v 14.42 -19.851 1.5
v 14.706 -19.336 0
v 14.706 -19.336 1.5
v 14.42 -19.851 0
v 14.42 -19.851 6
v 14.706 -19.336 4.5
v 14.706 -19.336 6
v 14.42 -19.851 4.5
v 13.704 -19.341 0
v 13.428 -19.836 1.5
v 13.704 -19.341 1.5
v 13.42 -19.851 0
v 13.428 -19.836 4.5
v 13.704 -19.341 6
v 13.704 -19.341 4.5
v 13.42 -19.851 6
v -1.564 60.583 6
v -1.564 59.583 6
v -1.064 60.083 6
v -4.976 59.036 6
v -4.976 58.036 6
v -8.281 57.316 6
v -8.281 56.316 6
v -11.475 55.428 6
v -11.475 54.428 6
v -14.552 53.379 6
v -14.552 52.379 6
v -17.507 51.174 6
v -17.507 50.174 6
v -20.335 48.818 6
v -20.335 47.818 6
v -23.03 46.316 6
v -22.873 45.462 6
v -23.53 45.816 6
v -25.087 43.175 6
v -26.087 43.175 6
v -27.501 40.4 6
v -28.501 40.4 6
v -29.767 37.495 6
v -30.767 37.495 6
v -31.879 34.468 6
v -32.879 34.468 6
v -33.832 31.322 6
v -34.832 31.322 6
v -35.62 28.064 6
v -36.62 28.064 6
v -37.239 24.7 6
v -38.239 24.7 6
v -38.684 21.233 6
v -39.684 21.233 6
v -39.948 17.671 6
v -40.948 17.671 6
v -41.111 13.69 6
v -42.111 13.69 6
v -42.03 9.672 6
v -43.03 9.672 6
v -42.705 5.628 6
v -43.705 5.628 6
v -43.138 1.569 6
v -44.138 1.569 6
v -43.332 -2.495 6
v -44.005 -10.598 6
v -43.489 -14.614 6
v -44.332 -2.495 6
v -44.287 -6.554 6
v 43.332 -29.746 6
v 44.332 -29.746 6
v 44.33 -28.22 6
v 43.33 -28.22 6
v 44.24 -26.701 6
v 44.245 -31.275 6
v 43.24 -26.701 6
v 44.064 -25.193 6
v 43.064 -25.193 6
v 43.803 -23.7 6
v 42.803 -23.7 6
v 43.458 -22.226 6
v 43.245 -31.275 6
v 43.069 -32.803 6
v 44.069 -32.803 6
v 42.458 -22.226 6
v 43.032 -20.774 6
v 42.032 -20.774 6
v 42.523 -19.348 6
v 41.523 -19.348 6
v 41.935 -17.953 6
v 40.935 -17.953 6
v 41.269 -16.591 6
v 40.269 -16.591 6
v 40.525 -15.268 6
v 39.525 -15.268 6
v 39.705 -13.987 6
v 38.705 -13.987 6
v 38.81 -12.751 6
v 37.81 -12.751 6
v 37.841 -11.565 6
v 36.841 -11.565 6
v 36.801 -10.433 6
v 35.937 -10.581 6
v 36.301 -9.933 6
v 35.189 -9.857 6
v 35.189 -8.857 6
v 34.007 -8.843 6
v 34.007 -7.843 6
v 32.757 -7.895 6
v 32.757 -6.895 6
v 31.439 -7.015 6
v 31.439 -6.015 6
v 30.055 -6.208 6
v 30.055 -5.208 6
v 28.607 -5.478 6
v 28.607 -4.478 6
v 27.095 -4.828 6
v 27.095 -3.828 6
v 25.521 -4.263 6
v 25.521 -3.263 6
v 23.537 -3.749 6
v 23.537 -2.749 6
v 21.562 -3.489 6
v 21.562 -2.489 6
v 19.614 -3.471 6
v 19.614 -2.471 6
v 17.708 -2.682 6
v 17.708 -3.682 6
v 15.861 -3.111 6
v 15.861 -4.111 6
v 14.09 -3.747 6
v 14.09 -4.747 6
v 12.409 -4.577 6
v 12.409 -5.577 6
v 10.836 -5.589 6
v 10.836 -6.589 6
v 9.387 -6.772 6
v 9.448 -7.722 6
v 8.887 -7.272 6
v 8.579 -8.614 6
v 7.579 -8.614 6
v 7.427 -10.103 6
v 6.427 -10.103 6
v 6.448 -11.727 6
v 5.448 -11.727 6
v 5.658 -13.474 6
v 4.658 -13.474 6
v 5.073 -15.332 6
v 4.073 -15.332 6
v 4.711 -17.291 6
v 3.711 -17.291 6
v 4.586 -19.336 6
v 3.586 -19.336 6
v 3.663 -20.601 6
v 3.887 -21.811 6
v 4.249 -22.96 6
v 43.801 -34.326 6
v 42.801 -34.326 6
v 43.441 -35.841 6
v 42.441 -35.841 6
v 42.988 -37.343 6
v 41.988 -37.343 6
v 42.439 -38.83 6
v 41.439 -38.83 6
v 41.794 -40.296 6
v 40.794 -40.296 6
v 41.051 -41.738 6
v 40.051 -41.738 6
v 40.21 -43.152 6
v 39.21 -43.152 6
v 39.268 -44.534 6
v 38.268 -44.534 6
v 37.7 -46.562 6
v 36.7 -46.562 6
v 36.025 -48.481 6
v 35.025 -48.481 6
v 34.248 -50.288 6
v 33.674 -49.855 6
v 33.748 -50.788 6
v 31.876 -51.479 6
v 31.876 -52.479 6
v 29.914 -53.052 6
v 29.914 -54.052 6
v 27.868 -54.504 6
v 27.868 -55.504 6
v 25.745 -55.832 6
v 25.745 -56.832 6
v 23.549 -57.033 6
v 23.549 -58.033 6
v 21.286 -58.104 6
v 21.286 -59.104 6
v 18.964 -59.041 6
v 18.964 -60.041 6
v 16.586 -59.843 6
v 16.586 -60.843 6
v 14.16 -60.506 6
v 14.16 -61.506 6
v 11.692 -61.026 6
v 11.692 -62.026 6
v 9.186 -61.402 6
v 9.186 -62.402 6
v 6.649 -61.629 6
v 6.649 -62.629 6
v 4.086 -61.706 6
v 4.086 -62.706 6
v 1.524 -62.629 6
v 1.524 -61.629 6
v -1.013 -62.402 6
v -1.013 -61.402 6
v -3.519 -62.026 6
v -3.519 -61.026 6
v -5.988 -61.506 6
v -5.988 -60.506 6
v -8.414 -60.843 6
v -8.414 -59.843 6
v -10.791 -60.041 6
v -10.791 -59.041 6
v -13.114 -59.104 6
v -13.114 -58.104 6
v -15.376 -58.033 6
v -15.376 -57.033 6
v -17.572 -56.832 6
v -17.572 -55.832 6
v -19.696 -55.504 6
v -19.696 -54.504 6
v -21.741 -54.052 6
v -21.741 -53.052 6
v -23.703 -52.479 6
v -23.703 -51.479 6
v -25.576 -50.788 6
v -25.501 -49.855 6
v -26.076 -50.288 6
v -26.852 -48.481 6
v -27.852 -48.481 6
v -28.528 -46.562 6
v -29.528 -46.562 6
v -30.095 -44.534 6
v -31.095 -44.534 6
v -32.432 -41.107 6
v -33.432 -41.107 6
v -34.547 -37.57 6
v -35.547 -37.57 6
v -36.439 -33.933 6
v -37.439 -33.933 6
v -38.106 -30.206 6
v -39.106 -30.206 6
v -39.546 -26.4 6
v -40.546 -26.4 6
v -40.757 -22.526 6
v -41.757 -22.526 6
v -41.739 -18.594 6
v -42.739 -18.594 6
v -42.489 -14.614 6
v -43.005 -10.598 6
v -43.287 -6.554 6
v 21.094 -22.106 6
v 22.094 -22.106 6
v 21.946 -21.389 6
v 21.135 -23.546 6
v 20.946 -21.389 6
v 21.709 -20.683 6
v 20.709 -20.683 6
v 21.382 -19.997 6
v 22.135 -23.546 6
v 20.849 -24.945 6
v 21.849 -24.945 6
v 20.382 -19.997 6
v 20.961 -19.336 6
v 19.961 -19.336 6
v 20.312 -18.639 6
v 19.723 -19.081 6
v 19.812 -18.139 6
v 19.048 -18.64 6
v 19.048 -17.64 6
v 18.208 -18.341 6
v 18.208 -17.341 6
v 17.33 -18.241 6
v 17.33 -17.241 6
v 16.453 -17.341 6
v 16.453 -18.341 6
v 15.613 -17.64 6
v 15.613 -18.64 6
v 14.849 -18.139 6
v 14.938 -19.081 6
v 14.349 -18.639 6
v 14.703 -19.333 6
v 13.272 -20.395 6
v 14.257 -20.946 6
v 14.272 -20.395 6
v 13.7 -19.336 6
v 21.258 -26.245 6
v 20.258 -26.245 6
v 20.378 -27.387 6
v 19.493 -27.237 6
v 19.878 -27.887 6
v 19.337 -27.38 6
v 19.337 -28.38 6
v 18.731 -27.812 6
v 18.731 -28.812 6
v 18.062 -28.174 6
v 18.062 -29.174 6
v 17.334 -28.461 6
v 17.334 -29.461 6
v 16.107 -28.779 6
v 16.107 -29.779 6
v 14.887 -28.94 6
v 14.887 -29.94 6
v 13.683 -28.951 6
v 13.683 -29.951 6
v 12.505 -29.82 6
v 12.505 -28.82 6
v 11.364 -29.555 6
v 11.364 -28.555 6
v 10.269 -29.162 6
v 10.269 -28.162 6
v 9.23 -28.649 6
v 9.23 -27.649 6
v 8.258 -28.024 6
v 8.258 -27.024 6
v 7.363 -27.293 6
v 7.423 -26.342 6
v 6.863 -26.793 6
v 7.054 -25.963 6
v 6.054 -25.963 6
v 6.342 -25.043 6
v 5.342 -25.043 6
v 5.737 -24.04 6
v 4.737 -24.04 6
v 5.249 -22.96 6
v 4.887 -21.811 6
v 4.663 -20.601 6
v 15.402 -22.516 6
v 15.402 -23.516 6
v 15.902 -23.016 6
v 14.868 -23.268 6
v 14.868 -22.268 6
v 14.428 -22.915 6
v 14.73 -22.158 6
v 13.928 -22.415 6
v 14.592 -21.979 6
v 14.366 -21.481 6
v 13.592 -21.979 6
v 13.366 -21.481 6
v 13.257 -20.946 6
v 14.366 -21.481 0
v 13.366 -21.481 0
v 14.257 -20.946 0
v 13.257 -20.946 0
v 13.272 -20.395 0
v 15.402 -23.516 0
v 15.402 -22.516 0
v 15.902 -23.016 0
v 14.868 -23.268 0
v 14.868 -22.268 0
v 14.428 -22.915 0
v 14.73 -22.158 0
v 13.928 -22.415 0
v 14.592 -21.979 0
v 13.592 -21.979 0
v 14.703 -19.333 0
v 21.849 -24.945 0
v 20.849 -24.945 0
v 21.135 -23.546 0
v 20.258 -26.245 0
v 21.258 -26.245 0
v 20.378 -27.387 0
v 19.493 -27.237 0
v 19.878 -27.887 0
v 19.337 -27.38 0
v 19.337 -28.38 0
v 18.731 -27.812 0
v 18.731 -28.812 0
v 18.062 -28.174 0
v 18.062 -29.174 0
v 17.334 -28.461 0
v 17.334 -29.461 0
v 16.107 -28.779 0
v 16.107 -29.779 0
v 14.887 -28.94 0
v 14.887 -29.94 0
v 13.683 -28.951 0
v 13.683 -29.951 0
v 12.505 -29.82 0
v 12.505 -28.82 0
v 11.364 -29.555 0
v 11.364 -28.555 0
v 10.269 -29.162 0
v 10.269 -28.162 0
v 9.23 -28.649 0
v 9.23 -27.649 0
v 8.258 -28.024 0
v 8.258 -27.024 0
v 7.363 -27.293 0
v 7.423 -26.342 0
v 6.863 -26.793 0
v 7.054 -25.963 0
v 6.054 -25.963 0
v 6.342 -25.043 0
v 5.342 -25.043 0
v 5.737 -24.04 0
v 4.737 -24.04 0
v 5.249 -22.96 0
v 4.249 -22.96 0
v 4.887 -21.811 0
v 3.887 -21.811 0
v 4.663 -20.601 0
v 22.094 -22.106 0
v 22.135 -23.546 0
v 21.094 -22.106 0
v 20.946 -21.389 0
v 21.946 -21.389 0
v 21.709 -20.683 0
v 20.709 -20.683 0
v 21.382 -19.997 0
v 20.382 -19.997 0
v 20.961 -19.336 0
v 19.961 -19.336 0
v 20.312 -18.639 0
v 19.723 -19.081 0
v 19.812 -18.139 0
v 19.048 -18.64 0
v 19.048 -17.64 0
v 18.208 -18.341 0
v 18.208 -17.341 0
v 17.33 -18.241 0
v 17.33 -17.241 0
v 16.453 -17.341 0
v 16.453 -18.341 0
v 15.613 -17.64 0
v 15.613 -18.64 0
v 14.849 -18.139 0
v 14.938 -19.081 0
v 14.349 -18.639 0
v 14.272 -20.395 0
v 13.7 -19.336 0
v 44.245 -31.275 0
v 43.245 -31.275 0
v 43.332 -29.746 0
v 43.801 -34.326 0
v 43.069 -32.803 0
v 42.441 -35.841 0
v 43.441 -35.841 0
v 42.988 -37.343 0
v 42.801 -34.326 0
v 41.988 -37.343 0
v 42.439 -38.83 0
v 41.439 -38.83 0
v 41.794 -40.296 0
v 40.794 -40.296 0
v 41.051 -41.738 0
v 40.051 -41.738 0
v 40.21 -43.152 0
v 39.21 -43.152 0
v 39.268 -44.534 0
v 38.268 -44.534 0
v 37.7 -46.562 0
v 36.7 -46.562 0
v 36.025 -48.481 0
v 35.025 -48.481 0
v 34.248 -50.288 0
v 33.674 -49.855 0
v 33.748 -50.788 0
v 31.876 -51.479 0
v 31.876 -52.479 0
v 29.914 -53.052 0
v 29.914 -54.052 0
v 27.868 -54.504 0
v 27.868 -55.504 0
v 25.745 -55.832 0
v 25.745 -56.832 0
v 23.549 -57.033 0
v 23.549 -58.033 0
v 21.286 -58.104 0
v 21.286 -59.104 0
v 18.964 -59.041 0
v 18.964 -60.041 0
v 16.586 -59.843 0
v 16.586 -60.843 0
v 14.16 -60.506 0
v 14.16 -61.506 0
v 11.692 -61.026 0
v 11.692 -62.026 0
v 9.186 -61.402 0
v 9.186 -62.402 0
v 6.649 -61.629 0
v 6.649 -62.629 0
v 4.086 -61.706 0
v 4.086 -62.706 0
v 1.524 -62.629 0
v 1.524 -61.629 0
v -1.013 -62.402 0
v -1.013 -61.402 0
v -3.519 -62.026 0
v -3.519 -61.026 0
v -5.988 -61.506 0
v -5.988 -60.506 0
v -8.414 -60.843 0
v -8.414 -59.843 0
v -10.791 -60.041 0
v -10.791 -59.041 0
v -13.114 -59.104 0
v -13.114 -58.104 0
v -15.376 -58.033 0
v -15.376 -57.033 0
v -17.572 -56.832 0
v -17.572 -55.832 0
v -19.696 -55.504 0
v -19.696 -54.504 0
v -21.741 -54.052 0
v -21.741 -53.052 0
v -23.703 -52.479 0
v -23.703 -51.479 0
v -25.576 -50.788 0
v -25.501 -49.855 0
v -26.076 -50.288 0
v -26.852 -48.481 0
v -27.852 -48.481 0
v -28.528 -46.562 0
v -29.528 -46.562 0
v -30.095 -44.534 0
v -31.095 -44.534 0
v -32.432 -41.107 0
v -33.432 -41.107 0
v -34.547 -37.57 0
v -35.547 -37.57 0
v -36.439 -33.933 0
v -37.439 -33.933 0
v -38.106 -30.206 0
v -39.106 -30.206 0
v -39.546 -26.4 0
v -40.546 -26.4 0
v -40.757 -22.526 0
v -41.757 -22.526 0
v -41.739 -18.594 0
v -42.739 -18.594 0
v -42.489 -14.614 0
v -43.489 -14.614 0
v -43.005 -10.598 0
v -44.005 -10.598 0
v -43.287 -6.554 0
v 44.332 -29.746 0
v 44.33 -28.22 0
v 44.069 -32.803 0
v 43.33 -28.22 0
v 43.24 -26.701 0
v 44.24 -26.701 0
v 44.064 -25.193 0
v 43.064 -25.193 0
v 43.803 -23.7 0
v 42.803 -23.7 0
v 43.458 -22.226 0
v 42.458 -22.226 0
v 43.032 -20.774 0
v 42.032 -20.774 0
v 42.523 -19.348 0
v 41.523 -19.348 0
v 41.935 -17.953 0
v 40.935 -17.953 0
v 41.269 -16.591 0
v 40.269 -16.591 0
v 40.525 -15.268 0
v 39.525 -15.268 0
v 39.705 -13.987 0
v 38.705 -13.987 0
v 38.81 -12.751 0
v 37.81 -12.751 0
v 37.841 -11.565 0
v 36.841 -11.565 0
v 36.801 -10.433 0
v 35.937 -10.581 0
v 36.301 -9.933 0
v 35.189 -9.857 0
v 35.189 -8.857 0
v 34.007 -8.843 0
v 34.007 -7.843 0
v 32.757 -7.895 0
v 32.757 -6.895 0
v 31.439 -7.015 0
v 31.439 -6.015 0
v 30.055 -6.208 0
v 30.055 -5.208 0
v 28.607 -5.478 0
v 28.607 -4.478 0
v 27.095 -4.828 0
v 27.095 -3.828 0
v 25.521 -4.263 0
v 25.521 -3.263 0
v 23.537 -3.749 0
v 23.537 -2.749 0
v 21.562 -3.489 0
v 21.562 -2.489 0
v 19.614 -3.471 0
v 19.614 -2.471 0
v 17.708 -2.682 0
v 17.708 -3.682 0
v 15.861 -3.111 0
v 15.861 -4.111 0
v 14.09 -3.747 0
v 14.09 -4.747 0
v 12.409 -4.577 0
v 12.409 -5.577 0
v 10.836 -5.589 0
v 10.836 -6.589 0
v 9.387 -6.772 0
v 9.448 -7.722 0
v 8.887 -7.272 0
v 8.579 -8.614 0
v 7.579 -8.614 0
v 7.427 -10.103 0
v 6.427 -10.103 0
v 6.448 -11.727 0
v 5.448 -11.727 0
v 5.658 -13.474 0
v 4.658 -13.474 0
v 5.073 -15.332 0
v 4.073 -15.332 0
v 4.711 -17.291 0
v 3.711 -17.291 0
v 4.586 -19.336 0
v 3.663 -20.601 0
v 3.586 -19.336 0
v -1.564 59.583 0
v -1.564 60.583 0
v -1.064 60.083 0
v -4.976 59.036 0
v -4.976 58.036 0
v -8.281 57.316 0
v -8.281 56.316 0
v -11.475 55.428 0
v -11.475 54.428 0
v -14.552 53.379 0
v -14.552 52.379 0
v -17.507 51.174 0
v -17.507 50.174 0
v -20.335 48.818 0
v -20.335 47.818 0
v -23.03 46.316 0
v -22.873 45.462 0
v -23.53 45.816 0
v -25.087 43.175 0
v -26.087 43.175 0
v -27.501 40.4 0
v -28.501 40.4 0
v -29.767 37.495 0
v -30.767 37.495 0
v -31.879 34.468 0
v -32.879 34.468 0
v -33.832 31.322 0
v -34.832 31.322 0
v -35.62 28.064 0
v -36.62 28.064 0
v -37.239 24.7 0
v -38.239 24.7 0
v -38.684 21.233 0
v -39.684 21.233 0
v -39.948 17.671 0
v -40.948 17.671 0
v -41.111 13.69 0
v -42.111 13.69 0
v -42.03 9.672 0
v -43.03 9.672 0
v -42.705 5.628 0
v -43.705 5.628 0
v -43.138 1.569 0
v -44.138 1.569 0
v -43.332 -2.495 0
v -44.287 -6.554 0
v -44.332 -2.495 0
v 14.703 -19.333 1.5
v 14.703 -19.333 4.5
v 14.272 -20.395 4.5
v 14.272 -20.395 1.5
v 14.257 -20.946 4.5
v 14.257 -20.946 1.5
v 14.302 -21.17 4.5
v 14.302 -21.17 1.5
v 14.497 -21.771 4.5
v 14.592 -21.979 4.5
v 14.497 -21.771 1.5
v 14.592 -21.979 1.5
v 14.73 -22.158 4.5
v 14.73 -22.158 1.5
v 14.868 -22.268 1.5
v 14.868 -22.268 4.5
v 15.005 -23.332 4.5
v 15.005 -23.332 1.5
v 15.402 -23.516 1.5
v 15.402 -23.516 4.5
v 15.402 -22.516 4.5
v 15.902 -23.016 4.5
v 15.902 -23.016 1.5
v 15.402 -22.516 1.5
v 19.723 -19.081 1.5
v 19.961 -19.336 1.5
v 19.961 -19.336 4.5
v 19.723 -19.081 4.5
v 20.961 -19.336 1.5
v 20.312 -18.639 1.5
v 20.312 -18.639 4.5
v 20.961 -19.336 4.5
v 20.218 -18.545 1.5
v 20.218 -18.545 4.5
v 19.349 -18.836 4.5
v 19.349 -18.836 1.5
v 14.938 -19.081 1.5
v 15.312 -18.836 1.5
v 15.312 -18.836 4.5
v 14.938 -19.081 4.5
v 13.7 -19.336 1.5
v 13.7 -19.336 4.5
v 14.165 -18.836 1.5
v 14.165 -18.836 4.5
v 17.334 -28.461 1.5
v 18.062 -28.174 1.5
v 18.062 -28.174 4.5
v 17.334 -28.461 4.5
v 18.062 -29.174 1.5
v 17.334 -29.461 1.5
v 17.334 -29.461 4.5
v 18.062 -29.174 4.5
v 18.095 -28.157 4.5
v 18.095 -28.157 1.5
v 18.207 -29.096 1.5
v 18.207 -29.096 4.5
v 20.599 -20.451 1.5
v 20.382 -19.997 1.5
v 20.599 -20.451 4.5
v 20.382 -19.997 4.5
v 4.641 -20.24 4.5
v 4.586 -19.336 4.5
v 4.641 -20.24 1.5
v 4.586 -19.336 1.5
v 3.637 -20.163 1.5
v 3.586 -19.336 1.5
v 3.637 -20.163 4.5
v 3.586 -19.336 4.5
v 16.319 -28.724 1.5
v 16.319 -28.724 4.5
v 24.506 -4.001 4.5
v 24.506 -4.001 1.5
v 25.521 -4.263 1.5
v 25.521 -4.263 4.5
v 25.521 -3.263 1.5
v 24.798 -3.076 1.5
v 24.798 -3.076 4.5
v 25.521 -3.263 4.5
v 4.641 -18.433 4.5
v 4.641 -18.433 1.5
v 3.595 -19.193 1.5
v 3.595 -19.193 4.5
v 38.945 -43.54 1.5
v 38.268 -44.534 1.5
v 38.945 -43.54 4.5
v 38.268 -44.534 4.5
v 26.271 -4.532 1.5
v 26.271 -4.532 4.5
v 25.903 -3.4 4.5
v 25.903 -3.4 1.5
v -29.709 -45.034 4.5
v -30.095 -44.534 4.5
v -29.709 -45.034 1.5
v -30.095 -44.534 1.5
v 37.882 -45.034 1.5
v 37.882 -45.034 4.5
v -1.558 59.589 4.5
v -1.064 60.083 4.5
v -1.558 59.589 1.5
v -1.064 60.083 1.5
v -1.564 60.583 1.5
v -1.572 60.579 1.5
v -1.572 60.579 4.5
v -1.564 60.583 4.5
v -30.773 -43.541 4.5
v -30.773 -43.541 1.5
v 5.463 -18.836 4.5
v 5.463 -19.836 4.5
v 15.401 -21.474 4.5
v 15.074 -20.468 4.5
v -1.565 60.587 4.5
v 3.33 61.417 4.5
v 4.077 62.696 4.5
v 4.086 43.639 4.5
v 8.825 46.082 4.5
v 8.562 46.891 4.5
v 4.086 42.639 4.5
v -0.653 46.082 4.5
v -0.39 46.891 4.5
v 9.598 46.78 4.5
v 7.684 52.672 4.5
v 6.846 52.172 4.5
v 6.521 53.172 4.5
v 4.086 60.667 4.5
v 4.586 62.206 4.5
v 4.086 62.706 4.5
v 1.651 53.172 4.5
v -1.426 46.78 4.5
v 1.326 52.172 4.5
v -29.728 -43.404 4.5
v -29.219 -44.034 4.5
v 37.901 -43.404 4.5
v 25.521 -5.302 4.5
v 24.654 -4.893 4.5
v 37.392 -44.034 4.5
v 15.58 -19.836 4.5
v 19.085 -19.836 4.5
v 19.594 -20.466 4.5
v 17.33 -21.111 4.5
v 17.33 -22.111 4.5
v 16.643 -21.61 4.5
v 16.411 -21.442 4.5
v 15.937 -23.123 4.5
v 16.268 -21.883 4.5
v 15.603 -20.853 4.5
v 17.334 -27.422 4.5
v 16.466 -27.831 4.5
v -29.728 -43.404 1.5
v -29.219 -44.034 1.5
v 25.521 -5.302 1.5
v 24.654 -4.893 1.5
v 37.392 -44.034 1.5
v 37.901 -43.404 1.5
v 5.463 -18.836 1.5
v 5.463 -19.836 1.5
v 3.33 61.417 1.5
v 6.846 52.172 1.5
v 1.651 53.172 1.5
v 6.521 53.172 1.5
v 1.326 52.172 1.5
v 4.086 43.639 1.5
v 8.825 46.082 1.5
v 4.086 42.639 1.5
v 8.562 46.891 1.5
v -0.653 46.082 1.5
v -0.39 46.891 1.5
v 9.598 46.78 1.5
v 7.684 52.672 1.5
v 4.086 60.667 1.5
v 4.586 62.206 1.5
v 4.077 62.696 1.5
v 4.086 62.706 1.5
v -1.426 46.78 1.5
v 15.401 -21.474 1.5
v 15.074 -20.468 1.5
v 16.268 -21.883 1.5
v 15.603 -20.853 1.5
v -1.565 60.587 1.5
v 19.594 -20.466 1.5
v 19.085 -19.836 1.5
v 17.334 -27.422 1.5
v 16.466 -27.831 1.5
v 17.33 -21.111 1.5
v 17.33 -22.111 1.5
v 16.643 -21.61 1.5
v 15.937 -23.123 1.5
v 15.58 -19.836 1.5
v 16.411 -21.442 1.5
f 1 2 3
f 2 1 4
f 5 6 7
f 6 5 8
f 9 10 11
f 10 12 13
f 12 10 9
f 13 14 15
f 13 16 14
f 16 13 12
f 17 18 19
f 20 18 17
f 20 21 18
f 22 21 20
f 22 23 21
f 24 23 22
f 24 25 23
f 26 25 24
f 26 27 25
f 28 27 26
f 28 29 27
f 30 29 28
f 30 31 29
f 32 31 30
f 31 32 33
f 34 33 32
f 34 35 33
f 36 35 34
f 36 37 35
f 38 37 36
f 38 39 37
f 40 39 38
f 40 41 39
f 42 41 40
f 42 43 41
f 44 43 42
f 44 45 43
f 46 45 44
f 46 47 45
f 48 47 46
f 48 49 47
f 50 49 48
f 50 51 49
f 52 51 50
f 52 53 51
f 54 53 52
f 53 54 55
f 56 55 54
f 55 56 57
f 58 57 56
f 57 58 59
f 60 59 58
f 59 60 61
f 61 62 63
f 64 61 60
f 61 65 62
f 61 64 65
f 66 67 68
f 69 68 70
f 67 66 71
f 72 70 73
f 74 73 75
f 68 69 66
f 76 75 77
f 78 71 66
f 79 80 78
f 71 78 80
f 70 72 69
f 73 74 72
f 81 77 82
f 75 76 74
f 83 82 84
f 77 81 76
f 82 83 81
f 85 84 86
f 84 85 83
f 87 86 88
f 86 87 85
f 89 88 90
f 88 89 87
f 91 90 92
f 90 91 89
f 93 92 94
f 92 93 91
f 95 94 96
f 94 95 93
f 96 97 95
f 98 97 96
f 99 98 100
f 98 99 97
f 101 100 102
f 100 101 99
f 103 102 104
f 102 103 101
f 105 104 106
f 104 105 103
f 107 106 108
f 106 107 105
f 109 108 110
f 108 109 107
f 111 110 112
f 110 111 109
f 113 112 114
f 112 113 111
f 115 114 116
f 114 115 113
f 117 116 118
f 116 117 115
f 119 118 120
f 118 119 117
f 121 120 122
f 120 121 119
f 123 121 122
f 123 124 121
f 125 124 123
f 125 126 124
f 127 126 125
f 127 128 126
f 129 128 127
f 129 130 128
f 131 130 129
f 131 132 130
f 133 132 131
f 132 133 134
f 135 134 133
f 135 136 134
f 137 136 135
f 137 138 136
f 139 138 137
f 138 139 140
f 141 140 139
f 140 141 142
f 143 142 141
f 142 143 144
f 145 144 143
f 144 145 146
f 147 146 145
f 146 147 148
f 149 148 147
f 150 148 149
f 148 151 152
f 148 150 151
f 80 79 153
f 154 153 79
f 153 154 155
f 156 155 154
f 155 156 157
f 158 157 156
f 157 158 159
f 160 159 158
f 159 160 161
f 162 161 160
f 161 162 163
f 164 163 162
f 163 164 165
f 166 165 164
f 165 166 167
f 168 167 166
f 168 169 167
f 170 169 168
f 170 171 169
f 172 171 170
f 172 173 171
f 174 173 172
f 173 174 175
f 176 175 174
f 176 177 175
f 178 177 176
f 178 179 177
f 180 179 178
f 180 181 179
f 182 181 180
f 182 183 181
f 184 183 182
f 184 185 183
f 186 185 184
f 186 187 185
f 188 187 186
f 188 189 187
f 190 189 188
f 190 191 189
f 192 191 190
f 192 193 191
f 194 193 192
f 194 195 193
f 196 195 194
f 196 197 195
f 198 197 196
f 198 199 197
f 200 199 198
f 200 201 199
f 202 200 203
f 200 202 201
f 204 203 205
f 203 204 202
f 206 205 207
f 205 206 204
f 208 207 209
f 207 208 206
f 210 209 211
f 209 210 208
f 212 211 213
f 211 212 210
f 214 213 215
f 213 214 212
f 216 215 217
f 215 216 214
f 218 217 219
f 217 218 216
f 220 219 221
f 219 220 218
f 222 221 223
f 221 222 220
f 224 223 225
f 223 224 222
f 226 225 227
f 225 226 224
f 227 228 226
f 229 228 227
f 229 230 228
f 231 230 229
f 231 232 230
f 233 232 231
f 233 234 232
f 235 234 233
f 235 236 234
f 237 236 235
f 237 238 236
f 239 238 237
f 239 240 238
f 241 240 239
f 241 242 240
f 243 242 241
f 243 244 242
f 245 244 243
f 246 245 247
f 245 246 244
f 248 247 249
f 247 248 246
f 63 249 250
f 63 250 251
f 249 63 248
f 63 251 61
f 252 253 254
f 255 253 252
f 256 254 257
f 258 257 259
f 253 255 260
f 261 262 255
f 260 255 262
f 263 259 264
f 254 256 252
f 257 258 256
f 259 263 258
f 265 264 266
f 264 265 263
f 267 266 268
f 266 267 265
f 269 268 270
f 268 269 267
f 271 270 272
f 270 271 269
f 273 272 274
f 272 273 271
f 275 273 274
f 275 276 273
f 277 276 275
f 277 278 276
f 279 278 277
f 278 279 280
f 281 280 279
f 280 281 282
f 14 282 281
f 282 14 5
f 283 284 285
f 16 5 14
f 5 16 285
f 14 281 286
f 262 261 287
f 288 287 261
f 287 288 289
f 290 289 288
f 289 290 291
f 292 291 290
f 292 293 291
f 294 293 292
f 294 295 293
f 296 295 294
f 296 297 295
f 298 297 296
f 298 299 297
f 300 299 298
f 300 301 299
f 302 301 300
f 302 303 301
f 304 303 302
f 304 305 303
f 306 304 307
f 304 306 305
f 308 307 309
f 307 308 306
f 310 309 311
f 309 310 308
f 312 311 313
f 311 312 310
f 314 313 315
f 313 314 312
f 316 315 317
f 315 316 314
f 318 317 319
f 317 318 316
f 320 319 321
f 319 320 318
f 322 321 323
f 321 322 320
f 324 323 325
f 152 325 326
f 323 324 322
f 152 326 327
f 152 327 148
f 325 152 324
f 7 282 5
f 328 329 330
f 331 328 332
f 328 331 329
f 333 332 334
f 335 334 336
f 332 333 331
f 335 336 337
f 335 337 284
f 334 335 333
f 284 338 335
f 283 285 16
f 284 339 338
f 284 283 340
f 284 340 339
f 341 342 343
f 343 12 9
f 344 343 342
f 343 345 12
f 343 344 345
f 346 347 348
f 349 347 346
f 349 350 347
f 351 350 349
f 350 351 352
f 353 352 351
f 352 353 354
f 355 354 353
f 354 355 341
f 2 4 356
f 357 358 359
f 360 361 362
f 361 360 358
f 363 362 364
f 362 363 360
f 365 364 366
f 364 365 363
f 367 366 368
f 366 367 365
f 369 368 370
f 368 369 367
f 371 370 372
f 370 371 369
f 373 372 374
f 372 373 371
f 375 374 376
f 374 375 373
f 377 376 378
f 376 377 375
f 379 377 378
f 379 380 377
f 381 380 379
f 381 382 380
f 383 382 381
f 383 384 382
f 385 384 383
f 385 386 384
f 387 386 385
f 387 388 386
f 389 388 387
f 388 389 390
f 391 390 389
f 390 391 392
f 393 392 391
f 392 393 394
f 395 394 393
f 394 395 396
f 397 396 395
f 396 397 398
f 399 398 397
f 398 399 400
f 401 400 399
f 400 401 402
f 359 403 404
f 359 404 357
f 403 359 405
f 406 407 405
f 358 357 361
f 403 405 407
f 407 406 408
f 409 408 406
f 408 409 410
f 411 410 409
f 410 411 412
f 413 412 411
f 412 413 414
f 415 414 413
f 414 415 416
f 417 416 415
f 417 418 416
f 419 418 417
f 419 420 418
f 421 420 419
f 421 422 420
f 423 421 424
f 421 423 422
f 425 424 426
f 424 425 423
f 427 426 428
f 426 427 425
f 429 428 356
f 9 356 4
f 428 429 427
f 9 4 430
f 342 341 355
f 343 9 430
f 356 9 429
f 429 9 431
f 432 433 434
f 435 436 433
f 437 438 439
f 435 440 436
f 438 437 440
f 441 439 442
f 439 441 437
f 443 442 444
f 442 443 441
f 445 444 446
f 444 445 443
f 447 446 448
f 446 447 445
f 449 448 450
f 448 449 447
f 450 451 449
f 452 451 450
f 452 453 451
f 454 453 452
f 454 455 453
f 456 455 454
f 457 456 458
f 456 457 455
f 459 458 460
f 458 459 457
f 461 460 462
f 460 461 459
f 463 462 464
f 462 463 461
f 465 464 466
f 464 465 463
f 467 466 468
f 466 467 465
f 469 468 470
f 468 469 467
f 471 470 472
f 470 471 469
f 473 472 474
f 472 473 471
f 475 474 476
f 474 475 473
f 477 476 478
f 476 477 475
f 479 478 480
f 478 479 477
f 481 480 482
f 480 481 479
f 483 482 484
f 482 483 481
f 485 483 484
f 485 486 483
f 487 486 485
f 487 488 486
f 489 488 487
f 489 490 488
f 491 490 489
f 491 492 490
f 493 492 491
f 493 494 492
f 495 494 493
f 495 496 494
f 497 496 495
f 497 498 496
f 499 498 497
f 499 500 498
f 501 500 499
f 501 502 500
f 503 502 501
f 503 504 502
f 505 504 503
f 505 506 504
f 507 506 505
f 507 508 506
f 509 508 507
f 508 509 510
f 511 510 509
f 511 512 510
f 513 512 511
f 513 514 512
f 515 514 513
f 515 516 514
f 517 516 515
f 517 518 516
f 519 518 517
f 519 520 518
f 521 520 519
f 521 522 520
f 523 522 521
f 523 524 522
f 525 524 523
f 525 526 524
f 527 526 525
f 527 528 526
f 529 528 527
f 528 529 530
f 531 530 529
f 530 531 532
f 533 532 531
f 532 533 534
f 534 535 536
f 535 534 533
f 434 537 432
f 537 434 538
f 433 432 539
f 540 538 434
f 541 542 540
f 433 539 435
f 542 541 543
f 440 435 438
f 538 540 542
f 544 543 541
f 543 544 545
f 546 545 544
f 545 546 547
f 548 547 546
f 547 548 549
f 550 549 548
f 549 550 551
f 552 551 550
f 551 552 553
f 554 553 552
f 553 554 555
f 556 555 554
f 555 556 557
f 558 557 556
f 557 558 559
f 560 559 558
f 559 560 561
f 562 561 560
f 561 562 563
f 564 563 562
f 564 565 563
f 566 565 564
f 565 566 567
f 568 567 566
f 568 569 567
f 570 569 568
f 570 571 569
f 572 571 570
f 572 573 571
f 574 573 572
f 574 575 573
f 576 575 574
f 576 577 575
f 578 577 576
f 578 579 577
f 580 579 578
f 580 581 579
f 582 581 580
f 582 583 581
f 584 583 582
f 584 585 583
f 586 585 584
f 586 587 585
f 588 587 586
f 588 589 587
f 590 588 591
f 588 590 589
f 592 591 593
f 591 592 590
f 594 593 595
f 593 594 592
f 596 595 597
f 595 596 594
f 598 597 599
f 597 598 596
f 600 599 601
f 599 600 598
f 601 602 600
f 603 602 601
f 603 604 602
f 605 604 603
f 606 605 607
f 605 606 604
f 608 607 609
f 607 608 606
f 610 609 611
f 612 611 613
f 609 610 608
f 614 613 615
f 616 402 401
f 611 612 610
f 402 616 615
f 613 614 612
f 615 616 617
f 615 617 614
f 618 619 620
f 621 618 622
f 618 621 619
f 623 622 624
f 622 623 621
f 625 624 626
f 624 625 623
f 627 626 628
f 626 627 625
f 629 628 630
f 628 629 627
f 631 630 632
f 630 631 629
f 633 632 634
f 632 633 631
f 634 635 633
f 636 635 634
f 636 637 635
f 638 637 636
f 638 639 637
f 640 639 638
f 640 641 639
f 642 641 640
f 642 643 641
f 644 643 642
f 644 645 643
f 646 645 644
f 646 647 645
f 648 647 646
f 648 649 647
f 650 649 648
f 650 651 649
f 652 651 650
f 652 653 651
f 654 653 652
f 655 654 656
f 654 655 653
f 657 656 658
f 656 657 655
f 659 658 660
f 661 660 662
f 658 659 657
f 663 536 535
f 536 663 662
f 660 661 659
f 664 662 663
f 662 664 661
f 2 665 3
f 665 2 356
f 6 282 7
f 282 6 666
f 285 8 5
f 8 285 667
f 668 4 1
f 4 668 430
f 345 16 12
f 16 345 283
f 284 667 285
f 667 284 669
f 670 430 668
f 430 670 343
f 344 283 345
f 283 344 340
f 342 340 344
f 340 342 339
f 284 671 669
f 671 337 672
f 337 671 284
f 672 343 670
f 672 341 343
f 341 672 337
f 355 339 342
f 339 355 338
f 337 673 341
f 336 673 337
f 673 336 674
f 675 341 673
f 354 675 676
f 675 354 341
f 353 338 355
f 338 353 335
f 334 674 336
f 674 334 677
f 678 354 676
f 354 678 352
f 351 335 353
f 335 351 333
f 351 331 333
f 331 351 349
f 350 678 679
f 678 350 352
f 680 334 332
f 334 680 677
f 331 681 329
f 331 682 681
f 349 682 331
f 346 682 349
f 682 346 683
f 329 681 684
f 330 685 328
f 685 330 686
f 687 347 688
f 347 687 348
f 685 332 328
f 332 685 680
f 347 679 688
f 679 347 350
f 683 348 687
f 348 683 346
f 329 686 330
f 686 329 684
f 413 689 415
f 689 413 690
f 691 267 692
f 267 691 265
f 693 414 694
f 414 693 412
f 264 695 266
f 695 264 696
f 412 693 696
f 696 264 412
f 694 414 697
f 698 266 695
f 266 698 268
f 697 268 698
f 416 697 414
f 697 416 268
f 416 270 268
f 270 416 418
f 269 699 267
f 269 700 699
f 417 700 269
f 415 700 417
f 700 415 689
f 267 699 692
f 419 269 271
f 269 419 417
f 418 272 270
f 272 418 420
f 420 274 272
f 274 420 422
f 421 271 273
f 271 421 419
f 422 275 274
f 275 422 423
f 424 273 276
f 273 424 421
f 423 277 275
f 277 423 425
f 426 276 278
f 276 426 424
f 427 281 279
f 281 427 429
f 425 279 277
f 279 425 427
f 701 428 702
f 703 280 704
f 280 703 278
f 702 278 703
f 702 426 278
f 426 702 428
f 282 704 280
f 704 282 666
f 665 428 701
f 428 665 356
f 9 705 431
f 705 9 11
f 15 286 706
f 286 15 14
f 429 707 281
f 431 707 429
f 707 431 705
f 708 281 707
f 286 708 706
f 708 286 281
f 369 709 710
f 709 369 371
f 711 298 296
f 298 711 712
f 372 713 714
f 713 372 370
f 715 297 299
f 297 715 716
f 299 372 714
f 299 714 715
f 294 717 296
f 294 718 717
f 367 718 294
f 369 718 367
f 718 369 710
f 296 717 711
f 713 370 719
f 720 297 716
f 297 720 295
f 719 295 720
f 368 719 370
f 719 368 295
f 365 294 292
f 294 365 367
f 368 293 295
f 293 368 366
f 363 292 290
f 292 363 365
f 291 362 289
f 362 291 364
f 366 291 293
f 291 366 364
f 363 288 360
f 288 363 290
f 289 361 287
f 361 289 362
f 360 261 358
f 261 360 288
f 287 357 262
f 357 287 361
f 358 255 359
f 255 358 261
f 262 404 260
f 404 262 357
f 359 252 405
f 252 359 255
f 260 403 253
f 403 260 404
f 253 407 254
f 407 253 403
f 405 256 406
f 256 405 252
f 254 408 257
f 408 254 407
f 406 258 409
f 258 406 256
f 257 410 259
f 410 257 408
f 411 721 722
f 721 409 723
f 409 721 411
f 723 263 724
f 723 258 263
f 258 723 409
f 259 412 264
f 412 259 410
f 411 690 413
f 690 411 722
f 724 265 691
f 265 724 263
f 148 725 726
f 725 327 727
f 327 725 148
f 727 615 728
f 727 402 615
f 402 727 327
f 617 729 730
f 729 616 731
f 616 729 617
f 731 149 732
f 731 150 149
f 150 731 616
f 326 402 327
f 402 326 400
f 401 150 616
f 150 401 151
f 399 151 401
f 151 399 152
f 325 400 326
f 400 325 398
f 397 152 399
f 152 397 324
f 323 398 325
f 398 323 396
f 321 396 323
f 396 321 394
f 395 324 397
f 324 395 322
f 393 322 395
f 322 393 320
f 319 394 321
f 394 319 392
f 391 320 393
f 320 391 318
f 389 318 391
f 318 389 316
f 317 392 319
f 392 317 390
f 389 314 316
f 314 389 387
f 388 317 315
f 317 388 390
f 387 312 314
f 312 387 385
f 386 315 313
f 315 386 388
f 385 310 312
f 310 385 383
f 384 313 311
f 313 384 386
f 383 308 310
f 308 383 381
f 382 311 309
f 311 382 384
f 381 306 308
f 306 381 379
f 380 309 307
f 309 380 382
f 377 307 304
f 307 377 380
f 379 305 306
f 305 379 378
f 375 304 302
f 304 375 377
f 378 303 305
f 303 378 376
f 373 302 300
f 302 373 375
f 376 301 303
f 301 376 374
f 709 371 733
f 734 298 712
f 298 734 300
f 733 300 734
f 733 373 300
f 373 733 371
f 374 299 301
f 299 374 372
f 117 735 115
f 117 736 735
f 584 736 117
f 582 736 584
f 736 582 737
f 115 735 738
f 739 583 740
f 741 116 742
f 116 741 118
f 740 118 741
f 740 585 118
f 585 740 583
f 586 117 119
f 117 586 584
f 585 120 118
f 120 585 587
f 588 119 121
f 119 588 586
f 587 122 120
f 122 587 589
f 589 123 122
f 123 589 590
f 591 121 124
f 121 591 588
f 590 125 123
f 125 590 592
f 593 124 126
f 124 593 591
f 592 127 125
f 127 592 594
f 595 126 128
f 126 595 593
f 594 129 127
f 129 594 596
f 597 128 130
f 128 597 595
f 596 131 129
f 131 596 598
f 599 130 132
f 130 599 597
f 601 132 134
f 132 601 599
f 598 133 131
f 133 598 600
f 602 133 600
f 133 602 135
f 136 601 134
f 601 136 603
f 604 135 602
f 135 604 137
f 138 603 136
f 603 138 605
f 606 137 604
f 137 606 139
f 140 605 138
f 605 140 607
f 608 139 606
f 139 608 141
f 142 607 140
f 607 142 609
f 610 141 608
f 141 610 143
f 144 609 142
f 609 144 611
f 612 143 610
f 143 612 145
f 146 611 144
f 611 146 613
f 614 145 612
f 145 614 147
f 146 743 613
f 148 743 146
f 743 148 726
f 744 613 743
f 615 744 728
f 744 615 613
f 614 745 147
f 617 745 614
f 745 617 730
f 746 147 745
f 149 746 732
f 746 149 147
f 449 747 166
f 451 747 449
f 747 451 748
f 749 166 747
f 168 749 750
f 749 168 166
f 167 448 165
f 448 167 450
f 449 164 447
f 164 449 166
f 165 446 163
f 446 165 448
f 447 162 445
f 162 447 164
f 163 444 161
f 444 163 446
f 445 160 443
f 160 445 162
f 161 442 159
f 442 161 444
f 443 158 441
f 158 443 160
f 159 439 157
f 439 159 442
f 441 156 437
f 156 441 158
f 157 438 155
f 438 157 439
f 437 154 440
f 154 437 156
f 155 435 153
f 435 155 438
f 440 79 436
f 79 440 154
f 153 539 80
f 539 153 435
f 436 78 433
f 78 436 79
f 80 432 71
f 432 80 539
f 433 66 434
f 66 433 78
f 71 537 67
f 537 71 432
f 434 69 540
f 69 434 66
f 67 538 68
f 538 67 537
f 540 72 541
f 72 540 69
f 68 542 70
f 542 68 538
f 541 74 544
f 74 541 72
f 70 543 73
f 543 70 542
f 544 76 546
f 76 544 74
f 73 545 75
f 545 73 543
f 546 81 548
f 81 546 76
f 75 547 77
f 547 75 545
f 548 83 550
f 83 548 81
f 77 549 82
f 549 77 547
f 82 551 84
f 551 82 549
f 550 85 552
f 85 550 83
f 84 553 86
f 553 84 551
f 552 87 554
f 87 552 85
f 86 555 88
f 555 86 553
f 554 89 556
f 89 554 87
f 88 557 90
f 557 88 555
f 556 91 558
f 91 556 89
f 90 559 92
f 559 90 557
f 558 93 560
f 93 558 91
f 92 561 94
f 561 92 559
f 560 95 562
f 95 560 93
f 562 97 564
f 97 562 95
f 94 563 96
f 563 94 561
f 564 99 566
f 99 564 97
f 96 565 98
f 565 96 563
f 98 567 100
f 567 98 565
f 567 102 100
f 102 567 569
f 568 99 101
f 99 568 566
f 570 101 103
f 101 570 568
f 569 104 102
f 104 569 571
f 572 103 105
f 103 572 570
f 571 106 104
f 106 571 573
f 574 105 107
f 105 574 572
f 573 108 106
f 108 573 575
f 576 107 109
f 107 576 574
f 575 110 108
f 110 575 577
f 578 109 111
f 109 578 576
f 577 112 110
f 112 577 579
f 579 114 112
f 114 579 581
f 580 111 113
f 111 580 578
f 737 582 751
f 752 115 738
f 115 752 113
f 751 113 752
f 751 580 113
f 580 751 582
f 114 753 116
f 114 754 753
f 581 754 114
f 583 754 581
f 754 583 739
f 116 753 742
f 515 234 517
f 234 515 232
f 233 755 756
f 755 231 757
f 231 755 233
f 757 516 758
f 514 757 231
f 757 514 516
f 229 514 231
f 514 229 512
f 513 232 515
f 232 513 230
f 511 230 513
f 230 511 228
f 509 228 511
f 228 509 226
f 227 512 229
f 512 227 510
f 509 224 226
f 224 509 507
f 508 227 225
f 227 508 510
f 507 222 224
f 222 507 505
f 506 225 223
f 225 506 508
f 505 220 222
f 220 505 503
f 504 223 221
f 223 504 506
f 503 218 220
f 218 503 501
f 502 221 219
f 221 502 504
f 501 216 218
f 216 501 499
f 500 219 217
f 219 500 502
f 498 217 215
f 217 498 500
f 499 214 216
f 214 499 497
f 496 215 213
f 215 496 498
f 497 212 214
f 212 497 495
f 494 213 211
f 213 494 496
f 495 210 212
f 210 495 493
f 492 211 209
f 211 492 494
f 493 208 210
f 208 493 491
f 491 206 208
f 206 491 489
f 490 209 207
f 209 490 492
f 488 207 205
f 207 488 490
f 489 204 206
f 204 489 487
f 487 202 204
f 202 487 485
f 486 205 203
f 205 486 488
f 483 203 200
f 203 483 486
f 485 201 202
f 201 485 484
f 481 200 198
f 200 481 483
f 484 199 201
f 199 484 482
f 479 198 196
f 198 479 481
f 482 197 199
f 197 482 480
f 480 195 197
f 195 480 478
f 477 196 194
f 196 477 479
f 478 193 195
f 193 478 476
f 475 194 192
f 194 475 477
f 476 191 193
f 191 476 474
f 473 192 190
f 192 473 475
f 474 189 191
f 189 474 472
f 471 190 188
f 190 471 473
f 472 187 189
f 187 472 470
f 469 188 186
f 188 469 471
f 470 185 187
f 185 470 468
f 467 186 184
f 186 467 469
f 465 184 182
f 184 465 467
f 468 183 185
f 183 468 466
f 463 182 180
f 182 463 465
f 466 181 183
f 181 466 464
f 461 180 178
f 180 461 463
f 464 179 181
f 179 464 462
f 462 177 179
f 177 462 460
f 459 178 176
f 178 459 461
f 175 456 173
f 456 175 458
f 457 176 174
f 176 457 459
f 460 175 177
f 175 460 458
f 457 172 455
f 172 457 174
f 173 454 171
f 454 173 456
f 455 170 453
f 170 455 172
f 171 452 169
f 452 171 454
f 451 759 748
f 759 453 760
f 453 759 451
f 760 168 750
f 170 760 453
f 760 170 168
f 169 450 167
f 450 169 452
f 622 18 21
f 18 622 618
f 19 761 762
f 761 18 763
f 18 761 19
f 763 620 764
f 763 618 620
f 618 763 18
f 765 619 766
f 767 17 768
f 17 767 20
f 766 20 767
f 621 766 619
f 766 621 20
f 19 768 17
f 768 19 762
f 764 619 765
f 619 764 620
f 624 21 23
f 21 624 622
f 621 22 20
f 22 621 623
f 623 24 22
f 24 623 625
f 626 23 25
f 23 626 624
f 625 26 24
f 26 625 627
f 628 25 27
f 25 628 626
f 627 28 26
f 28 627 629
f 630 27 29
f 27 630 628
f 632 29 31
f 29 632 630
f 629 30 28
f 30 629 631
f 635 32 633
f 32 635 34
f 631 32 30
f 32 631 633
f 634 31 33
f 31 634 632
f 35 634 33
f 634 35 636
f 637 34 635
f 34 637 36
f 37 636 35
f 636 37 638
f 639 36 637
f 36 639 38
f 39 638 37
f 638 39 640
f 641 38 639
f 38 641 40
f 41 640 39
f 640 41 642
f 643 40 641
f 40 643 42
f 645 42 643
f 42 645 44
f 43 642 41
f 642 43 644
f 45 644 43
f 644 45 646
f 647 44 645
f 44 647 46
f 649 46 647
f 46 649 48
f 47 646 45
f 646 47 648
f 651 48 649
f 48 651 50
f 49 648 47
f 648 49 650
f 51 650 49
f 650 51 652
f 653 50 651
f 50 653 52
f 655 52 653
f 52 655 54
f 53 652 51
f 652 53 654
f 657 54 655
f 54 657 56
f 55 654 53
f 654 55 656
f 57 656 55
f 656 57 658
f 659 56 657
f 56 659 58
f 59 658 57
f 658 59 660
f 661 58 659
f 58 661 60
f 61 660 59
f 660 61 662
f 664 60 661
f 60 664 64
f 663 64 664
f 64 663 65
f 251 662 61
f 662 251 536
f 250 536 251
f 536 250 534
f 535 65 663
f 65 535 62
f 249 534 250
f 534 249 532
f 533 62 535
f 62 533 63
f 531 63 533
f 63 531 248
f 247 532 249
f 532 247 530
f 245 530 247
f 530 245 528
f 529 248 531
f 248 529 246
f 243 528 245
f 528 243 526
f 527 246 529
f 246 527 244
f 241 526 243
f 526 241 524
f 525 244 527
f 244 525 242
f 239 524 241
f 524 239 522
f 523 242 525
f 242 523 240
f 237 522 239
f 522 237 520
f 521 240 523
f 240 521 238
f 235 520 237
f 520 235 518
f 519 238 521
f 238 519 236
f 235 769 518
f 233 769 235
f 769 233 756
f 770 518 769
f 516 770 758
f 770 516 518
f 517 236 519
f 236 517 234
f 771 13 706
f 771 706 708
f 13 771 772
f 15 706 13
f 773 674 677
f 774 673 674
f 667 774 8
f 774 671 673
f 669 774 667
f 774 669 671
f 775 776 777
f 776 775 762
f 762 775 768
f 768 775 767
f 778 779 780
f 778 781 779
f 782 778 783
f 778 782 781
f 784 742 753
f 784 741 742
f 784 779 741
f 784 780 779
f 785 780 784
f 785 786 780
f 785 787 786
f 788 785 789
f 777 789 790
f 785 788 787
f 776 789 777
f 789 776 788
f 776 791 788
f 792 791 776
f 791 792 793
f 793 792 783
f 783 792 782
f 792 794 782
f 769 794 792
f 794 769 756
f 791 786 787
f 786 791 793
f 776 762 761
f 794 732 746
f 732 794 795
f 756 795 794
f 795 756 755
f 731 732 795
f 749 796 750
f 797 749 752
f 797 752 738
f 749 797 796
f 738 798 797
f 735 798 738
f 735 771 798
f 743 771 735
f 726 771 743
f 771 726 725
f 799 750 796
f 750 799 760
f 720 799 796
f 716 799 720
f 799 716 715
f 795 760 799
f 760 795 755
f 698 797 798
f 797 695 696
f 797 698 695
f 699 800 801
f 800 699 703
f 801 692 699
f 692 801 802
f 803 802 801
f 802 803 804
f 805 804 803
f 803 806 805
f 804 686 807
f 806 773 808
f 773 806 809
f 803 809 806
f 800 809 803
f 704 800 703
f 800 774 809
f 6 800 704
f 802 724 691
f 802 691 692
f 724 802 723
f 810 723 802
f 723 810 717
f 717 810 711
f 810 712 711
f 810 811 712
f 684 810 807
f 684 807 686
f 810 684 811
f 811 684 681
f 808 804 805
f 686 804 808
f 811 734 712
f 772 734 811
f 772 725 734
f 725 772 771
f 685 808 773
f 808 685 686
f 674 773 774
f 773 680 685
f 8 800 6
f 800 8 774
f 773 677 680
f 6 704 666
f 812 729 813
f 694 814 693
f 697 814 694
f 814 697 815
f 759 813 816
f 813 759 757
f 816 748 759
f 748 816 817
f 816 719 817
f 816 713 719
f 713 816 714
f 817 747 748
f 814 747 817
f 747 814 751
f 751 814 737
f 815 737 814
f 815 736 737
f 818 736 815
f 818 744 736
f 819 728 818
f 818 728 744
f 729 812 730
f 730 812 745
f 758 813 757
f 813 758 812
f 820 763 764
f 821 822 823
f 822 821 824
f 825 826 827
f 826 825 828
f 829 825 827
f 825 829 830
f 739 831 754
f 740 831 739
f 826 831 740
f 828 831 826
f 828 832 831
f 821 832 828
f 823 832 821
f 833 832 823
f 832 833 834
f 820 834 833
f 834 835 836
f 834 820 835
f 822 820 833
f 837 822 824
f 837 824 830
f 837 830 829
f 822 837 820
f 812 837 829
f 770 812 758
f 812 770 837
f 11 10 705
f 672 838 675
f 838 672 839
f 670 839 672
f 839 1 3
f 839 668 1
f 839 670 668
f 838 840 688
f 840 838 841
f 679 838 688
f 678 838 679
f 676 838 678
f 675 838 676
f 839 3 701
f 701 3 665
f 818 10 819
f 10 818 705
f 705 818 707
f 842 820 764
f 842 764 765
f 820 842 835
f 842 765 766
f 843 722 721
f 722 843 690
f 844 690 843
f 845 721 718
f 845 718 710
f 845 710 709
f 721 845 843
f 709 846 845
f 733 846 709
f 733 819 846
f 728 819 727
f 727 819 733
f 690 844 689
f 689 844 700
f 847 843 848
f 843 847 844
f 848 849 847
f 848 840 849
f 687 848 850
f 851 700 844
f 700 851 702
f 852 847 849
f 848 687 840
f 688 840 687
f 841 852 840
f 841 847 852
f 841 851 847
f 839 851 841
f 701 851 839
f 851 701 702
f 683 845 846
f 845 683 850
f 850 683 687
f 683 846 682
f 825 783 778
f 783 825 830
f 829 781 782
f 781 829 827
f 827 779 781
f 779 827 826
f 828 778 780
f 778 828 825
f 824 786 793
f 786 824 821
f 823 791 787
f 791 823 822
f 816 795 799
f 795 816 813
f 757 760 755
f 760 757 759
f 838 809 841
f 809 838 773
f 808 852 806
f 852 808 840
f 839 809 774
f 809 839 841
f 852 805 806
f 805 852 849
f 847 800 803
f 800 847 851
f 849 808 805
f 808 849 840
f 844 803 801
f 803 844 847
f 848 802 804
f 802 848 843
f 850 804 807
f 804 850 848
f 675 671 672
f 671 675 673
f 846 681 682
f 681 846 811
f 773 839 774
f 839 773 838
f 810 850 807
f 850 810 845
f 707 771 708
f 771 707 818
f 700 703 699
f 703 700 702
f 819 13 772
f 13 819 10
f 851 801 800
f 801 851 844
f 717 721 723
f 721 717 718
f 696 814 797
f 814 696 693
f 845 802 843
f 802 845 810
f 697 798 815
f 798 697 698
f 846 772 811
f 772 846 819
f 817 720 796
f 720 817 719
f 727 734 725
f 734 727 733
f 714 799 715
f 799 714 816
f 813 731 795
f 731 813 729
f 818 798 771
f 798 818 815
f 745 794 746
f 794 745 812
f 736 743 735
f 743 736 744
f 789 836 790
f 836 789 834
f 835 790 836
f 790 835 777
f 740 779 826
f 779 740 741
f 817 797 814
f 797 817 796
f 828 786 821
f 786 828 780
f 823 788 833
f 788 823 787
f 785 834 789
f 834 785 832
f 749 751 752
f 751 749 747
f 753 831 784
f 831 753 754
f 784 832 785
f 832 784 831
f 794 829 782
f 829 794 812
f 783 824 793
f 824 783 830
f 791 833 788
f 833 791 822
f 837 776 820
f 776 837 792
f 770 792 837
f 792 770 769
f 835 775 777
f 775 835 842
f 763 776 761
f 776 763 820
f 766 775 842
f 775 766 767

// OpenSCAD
// Module names are of the form poly_<inkscape-path-id>().  As a result,
// you can associate a polygon in this OpenSCAD program with the corresponding
// SVG element in the Inkscape document by looking for the XML element with
// the attribute id="inkscape-path-id".

// fudge value is used to ensure that subtracted solids are a tad taller
// in the z dimension than the polygon being subtracted from.  This helps
// keep the resulting .stl file manifold.
fudge = 0.1;
height = 5;
line_fn = 4;
min_line_width = 1.0;
function min_line_mm(w) = max(min_line_width, w) * 90/25.4;


path4286_0_center = [4.460870,-216.646445];
path4286_0_points = [[-5.545955,-212.905725],[14.467695,-220.387165]];
module poly_path4286(h, w, s, res=line_fn)
{
  scale([25.4/90, -25.4/90, 1]) union()
  {
    for (t = [0: len(path4286_0_points)-2]) {
      hull() {
        translate(path4286_0_points[t]) 
          cylinder(h=h, r=w/2, $fn=res);
        translate(path4286_0_points[t + 1]) 
          cylinder(h=h, r=w/2, $fn=res);
      }
    }
  }
}

path4209_0_center = [51.659111,75.034640];
path4209_0_points = [[50.337655,68.514815],[49.321681,70.339201],[48.798986,72.267105],[48.743727,74.218991],[49.130061,76.115326],[49.932148,77.876575],[51.124144,79.423205],[52.680207,80.675679],[54.574495,81.554465]];
path4209_1_center = [61.407165,65.688942];
path4209_1_points = [[72.499345,68.514815],[70.198753,66.042177],[67.493201,64.276006],[64.517676,63.216304],[61.407165,62.863070],[58.296654,63.216304],[55.321130,64.276006],[52.615578,66.042177],[50.314985,68.514815]];
path4209_2_center = [69.038162,85.566485];
path4209_2_points = [[61.418495,102.618155],[63.999869,101.602263],[66.368730,100.316580],[68.516652,98.787047],[70.435205,97.039601],[73.550496,92.994727],[75.647179,88.389470],[76.657830,83.431340],[76.515024,78.327847],[75.990004,75.786436],[75.151337,73.286502],[73.990593,70.853982],[72.499345,68.514815]];
path4209_3_center = [37.948885,86.434366];
path4209_3_points = [[14.479275,68.514815],[14.751886,72.995087],[15.545917,77.283231],[16.825666,81.353309],[18.555431,85.179382],[20.699512,88.735512],[23.222206,91.995758],[26.087811,94.934184],[29.260626,97.524849],[32.704950,99.741815],[36.385079,101.559144],[40.265314,102.950896],[44.309951,103.891133],[48.483290,104.353917],[52.749628,104.313307],[57.073263,103.743366],[61.418495,102.618155]];
path4209_4_center = [52.453905,39.520367];
path4209_4_points = [[90.428535,13.334445],[83.397800,11.513813],[76.402008,10.591627],[69.498927,10.525919],[62.746322,11.274718],[56.201960,12.796054],[49.923608,15.047957],[43.969032,17.988458],[38.395999,21.575586],[33.262276,25.767372],[28.625629,30.521846],[24.543824,35.797037],[21.074629,41.550976],[18.275810,47.741694],[16.205134,54.327219],[14.920367,61.265583],[14.479275,68.514815]];
path4209_5_center = [122.869037,85.566480];
path4209_5_points = [[137.367755,157.798515],[140.703507,152.900378],[143.684786,147.889643],[146.316056,142.780046],[148.601779,137.585321],[150.546417,132.319203],[152.154434,126.995426],[153.430291,121.627726],[154.378453,116.229838],[155.003381,110.815495],[155.309538,105.398434],[155.301388,99.992388],[154.983392,94.611093],[154.360013,89.268284],[153.435715,83.977695],[152.214959,78.753060],[150.702209,73.608116],[148.901927,68.556597],[146.818576,63.612237],[144.456619,58.788771],[141.820518,54.099935],[138.914737,49.559462],[135.743737,45.181088],[132.311981,40.978548],[128.623933,36.965577],[124.684055,33.155908],[120.496810,29.563278],[116.066660,26.201421],[111.398068,23.084071],[106.495497,20.224964],[101.363409,17.637834],[96.006268,15.336416],[90.428535,13.334445]];
path4209_6_center = [14.479280,189.105915];
path4209_6_points = [[-108.409195,157.798515],[-102.853428,164.984279],[-96.917521,171.783074],[-90.622225,178.184324],[-83.988291,184.177459],[-77.036471,189.751903],[-69.787515,194.897085],[-62.262175,199.602430],[-54.481201,203.857365],[-46.465344,207.651318],[-38.235356,210.973714],[-29.811987,213.813982],[-21.215989,216.161546],[-12.468113,218.005835],[-3.589110,219.336275],[5.400270,220.142293],[14.479275,220.413315],[23.558282,220.142293],[32.547663,219.336275],[41.426668,218.005835],[50.174546,216.161546],[58.770545,213.813982],[67.193914,210.973714],[75.423903,207.651318],[83.439760,203.857365],[91.220735,199.602430],[98.746076,194.897085],[105.995032,189.751903],[112.946852,184.177459],[119.580786,178.184324],[125.876081,171.783074],[131.811988,164.984279],[137.367755,157.798515]];
path4209_7_center = [-80.425927,-27.547400];
path4209_7_points = [[-5.542315,-212.893315],[-17.631027,-207.409985],[-29.343253,-201.314791],[-40.660308,-194.627158],[-51.563505,-187.366512],[-62.034158,-179.552279],[-72.053582,-171.203885],[-81.603089,-162.340757],[-90.663995,-152.982319],[-99.217612,-143.147998],[-107.245255,-132.857220],[-114.728238,-122.129411],[-121.647874,-110.983996],[-127.985478,-99.440402],[-133.722363,-87.518055],[-138.839843,-75.236381],[-143.319233,-62.614805],[-147.441675,-48.508139],[-150.696032,-34.271896],[-153.088199,-19.943293],[-154.624069,-5.559550],[-155.309538,8.842114],[-155.150502,23.224479],[-154.152854,37.550327],[-152.322491,51.782439],[-149.665306,65.883594],[-146.187195,79.816575],[-141.894053,93.544162],[-136.791774,107.029135],[-130.886254,120.234277],[-124.183388,133.122366],[-116.689069,145.656186],[-108.409195,157.798515]];
module poly_path4209(h, w, s, res=line_fn)
{
  scale([25.4/90, -25.4/90, 1]) union()
  {
    for (t = [0: len(path4209_0_points)-2]) {
      hull() {
        translate(path4209_0_points[t]) 
          cylinder(h=h, r=w/2, $fn=res);
        translate(path4209_0_points[t + 1]) 
          cylinder(h=h, r=w/2, $fn=res);
      }
    }
    for (t = [0: len(path4209_1_points)-2]) {
      hull() {
        translate(path4209_1_points[t]) 
          cylinder(h=h, r=w/2, $fn=res);
        translate(path4209_1_points[t + 1]) 
          cylinder(h=h, r=w/2, $fn=res);
      }
    }
    for (t = [0: len(path4209_2_points)-2]) {
      hull() {
        translate(path4209_2_points[t]) 
          cylinder(h=h, r=w/2, $fn=res);
        translate(path4209_2_points[t + 1]) 
          cylinder(h=h, r=w/2, $fn=res);
      }
    }
    for (t = [0: len(path4209_3_points)-2]) {
      hull() {
        translate(path4209_3_points[t]) 
          cylinder(h=h, r=w/2, $fn=res);
        translate(path4209_3_points[t + 1]) 
          cylinder(h=h, r=w/2, $fn=res);
      }
    }
    for (t = [0: len(path4209_4_points)-2]) {
      hull() {
        translate(path4209_4_points[t]) 
          cylinder(h=h, r=w/2, $fn=res);
        translate(path4209_4_points[t + 1]) 
          cylinder(h=h, r=w/2, $fn=res);
      }
    }
    for (t = [0: len(path4209_5_points)-2]) {
      hull() {
        translate(path4209_5_points[t]) 
          cylinder(h=h, r=w/2, $fn=res);
        translate(path4209_5_points[t + 1]) 
          cylinder(h=h, r=w/2, $fn=res);
      }
    }
    for (t = [0: len(path4209_6_points)-2]) {
      hull() {
        translate(path4209_6_points[t]) 
          cylinder(h=h, r=w/2, $fn=res);
        translate(path4209_6_points[t + 1]) 
          cylinder(h=h, r=w/2, $fn=res);
      }
    }
    for (t = [0: len(path4209_7_points)-2]) {
      hull() {
        translate(path4209_7_points[t]) 
          cylinder(h=h, r=w/2, $fn=res);
        translate(path4209_7_points[t + 1]) 
          cylinder(h=h, r=w/2, $fn=res);
      }
    }
  }
}

path4217_0_center = [5.599775,-159.305400];
path4217_0_points = [[-3.279725,-165.756735],[14.479275,-152.854065]];
path4217_1_center = [23.358780,-159.305400];
path4217_1_points = [[32.238285,-165.756735],[14.479275,-152.854065]];
path4217_2_center = [14.479280,-186.633695];
path4217_2_points = [[3.503615,-186.633695],[25.454945,-186.633695]];
path4217_3_center = [14.479280,157.798515];
path4217_3_points = [[-108.409195,157.798515],[137.367755,157.798515]];
path4217_4_center = [55.876735,77.519895];
path4217_4_points = [[54.570155,81.541125],[57.183315,73.498665]];
path4217_5_center = [55.872410,72.544285];
path4217_5_points = [[50.337655,68.514815],[61.407165,76.573755]];
path4217_6_center = [63.534750,75.027970];
path4217_6_points = [[72.499345,68.514815],[54.570155,81.541125]];
path4217_7_center = [55.878075,85.566485];
path4217_7_points = [[61.418495,102.618155],[50.337655,68.514815]];
path4217_8_center = [43.489310,68.514815];
path4217_8_points = [[14.479275,68.514815],[72.499345,68.514815]];
path4217_9_center = [75.923515,57.976300];
path4217_9_points = [[90.428535,13.334445],[61.418495,102.618155]];
path4217_10_center = [75.923515,113.156665];
path4217_10_points = [[14.479275,68.514815],[137.367755,157.798515]];
path4217_11_center = [-8.990330,85.566480];
path4217_11_points = [[-108.409195,157.798515],[90.428535,13.334445]];
path4217_12_center = [75.923515,-31.307400];
path4217_12_points = [[137.367755,157.798515],[14.479275,-220.413315]];
path4217_13_center = [-46.964960,-31.307400];
path4217_13_points = [[14.479275,-220.413315],[-108.409195,157.798515]];
module poly_path4217(h, w, s, res=line_fn)
{
  scale([25.4/90, -25.4/90, 1]) union()
  {
    for (t = [0: len(path4217_0_points)-2]) {
      hull() {
        translate(path4217_0_points[t]) 
          cylinder(h=h, r=w/2, $fn=res);
        translate(path4217_0_points[t + 1]) 
          cylinder(h=h, r=w/2, $fn=res);
      }
    }
    for (t = [0: len(path4217_1_points)-2]) {
      hull() {
        translate(path4217_1_points[t]) 
          cylinder(h=h, r=w/2, $fn=res);
        translate(path4217_1_points[t + 1]) 
          cylinder(h=h, r=w/2, $fn=res);
      }
    }
    for (t = [0: len(path4217_2_points)-2]) {
      hull() {
        translate(path4217_2_points[t]) 
          cylinder(h=h, r=w/2, $fn=res);
        translate(path4217_2_points[t + 1]) 
          cylinder(h=h, r=w/2, $fn=res);
      }
    }
    for (t = [0: len(path4217_3_points)-2]) {
      hull() {
        translate(path4217_3_points[t]) 
          cylinder(h=h, r=w/2, $fn=res);
        translate(path4217_3_points[t + 1]) 
          cylinder(h=h, r=w/2, $fn=res);
      }
    }
    for (t = [0: len(path4217_4_points)-2]) {
      hull() {
        translate(path4217_4_points[t]) 
          cylinder(h=h, r=w/2, $fn=res);
        translate(path4217_4_points[t + 1]) 
          cylinder(h=h, r=w/2, $fn=res);
      }
    }
    for (t = [0: len(path4217_5_points)-2]) {
      hull() {
        translate(path4217_5_points[t]) 
          cylinder(h=h, r=w/2, $fn=res);
        translate(path4217_5_points[t + 1]) 
          cylinder(h=h, r=w/2, $fn=res);
      }
    }
    for (t = [0: len(path4217_6_points)-2]) {
      hull() {
        translate(path4217_6_points[t]) 
          cylinder(h=h, r=w/2, $fn=res);
        translate(path4217_6_points[t + 1]) 
          cylinder(h=h, r=w/2, $fn=res);
      }
    }
    for (t = [0: len(path4217_7_points)-2]) {
      hull() {
        translate(path4217_7_points[t]) 
          cylinder(h=h, r=w/2, $fn=res);
        translate(path4217_7_points[t + 1]) 
          cylinder(h=h, r=w/2, $fn=res);
      }
    }
    for (t = [0: len(path4217_8_points)-2]) {
      hull() {
        translate(path4217_8_points[t]) 
          cylinder(h=h, r=w/2, $fn=res);
        translate(path4217_8_points[t + 1]) 
          cylinder(h=h, r=w/2, $fn=res);
      }
    }
    for (t = [0: len(path4217_9_points)-2]) {
      hull() {
        translate(path4217_9_points[t]) 
          cylinder(h=h, r=w/2, $fn=res);
        translate(path4217_9_points[t + 1]) 
          cylinder(h=h, r=w/2, $fn=res);
      }
    }
    for (t = [0: len(path4217_10_points)-2]) {
      hull() {
        translate(path4217_10_points[t]) 
          cylinder(h=h, r=w/2, $fn=res);
        translate(path4217_10_points[t + 1]) 
          cylinder(h=h, r=w/2, $fn=res);
      }
    }
    for (t = [0: len(path4217_11_points)-2]) {
      hull() {
        translate(path4217_11_points[t]) 
          cylinder(h=h, r=w/2, $fn=res);
        translate(path4217_11_points[t + 1]) 
          cylinder(h=h, r=w/2, $fn=res);
      }
    }
    for (t = [0: len(path4217_12_points)-2]) {
      hull() {
        translate(path4217_12_points[t]) 
          cylinder(h=h, r=w/2, $fn=res);
        translate(path4217_12_points[t + 1]) 
          cylinder(h=h, r=w/2, $fn=res);
      }
    }
    for (t = [0: len(path4217_13_points)-2]) {
      hull() {
        translate(path4217_13_points[t]) 
          cylinder(h=h, r=w/2, $fn=res);
        translate(path4217_13_points[t + 1]) 
          cylinder(h=h, r=w/2, $fn=res);
      }
    }
  }
}

module spiraleAurea(h)
{
  difference()
  {
    union()
    {
      translate ([0,0,1.5]) poly_path4286(3, min_line_mm(0.282222222222), 100.0);
      translate ([0,0,0]) poly_path4209(6, min_line_mm(1.0), 100.0);
      translate ([0,0,1.5]) poly_path4217(3, min_line_mm(1.0), 100.0);
    }
    union()
    {
    }
  }
}

spiraleAurea(height);
